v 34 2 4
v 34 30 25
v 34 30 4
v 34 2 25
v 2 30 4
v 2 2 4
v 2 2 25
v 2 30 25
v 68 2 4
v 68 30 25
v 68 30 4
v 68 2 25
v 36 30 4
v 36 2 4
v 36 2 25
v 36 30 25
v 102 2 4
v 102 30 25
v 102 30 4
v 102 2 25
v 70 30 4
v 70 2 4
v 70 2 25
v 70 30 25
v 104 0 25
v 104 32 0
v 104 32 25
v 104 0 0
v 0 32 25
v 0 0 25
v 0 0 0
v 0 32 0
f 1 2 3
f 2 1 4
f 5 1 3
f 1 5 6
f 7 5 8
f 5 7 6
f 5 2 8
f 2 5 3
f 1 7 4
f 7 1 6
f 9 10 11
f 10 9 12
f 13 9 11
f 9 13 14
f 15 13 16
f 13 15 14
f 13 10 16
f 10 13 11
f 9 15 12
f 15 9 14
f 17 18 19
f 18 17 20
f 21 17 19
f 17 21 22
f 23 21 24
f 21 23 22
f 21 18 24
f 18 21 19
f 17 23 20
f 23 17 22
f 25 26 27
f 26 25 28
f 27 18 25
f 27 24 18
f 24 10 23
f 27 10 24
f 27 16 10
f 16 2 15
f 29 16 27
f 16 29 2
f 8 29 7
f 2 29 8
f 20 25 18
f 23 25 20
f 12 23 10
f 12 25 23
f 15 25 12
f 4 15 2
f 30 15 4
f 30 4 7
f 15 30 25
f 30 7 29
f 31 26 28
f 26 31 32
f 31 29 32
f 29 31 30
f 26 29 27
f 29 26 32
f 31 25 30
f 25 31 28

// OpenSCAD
// Minimal parametric example for the 3D Print Collaborator skill.
// 3D design source is normally maintained by the chat assistant in GitHub.
// Units: millimeters.
// With the defaults below: 104 x 32 x 25 mm.

compartments = 3;
inside_length = 32;
inside_width  = 28;
inside_depth  = 21;
wall = 2.0;
floor = 4.0;
$fn = 48;

assert(compartments >= 1, "Must have at least one compartment");
assert(wall >= 1, "Wall must be strong enough to print");
assert(inside_length > 0 && inside_width > 0 && inside_depth > 0);

length = compartments * inside_length + (compartments + 1) * wall;
width = inside_width + 2*wall;
height = inside_depth + floor;

difference() {
    cube([length, width, height]);
    for (i = [0:compartments-1]) {
        translate([wall + i*(inside_length+wall), wall, floor])
            cube([inside_length, inside_width, inside_depth + 0.1]);
    }
}
